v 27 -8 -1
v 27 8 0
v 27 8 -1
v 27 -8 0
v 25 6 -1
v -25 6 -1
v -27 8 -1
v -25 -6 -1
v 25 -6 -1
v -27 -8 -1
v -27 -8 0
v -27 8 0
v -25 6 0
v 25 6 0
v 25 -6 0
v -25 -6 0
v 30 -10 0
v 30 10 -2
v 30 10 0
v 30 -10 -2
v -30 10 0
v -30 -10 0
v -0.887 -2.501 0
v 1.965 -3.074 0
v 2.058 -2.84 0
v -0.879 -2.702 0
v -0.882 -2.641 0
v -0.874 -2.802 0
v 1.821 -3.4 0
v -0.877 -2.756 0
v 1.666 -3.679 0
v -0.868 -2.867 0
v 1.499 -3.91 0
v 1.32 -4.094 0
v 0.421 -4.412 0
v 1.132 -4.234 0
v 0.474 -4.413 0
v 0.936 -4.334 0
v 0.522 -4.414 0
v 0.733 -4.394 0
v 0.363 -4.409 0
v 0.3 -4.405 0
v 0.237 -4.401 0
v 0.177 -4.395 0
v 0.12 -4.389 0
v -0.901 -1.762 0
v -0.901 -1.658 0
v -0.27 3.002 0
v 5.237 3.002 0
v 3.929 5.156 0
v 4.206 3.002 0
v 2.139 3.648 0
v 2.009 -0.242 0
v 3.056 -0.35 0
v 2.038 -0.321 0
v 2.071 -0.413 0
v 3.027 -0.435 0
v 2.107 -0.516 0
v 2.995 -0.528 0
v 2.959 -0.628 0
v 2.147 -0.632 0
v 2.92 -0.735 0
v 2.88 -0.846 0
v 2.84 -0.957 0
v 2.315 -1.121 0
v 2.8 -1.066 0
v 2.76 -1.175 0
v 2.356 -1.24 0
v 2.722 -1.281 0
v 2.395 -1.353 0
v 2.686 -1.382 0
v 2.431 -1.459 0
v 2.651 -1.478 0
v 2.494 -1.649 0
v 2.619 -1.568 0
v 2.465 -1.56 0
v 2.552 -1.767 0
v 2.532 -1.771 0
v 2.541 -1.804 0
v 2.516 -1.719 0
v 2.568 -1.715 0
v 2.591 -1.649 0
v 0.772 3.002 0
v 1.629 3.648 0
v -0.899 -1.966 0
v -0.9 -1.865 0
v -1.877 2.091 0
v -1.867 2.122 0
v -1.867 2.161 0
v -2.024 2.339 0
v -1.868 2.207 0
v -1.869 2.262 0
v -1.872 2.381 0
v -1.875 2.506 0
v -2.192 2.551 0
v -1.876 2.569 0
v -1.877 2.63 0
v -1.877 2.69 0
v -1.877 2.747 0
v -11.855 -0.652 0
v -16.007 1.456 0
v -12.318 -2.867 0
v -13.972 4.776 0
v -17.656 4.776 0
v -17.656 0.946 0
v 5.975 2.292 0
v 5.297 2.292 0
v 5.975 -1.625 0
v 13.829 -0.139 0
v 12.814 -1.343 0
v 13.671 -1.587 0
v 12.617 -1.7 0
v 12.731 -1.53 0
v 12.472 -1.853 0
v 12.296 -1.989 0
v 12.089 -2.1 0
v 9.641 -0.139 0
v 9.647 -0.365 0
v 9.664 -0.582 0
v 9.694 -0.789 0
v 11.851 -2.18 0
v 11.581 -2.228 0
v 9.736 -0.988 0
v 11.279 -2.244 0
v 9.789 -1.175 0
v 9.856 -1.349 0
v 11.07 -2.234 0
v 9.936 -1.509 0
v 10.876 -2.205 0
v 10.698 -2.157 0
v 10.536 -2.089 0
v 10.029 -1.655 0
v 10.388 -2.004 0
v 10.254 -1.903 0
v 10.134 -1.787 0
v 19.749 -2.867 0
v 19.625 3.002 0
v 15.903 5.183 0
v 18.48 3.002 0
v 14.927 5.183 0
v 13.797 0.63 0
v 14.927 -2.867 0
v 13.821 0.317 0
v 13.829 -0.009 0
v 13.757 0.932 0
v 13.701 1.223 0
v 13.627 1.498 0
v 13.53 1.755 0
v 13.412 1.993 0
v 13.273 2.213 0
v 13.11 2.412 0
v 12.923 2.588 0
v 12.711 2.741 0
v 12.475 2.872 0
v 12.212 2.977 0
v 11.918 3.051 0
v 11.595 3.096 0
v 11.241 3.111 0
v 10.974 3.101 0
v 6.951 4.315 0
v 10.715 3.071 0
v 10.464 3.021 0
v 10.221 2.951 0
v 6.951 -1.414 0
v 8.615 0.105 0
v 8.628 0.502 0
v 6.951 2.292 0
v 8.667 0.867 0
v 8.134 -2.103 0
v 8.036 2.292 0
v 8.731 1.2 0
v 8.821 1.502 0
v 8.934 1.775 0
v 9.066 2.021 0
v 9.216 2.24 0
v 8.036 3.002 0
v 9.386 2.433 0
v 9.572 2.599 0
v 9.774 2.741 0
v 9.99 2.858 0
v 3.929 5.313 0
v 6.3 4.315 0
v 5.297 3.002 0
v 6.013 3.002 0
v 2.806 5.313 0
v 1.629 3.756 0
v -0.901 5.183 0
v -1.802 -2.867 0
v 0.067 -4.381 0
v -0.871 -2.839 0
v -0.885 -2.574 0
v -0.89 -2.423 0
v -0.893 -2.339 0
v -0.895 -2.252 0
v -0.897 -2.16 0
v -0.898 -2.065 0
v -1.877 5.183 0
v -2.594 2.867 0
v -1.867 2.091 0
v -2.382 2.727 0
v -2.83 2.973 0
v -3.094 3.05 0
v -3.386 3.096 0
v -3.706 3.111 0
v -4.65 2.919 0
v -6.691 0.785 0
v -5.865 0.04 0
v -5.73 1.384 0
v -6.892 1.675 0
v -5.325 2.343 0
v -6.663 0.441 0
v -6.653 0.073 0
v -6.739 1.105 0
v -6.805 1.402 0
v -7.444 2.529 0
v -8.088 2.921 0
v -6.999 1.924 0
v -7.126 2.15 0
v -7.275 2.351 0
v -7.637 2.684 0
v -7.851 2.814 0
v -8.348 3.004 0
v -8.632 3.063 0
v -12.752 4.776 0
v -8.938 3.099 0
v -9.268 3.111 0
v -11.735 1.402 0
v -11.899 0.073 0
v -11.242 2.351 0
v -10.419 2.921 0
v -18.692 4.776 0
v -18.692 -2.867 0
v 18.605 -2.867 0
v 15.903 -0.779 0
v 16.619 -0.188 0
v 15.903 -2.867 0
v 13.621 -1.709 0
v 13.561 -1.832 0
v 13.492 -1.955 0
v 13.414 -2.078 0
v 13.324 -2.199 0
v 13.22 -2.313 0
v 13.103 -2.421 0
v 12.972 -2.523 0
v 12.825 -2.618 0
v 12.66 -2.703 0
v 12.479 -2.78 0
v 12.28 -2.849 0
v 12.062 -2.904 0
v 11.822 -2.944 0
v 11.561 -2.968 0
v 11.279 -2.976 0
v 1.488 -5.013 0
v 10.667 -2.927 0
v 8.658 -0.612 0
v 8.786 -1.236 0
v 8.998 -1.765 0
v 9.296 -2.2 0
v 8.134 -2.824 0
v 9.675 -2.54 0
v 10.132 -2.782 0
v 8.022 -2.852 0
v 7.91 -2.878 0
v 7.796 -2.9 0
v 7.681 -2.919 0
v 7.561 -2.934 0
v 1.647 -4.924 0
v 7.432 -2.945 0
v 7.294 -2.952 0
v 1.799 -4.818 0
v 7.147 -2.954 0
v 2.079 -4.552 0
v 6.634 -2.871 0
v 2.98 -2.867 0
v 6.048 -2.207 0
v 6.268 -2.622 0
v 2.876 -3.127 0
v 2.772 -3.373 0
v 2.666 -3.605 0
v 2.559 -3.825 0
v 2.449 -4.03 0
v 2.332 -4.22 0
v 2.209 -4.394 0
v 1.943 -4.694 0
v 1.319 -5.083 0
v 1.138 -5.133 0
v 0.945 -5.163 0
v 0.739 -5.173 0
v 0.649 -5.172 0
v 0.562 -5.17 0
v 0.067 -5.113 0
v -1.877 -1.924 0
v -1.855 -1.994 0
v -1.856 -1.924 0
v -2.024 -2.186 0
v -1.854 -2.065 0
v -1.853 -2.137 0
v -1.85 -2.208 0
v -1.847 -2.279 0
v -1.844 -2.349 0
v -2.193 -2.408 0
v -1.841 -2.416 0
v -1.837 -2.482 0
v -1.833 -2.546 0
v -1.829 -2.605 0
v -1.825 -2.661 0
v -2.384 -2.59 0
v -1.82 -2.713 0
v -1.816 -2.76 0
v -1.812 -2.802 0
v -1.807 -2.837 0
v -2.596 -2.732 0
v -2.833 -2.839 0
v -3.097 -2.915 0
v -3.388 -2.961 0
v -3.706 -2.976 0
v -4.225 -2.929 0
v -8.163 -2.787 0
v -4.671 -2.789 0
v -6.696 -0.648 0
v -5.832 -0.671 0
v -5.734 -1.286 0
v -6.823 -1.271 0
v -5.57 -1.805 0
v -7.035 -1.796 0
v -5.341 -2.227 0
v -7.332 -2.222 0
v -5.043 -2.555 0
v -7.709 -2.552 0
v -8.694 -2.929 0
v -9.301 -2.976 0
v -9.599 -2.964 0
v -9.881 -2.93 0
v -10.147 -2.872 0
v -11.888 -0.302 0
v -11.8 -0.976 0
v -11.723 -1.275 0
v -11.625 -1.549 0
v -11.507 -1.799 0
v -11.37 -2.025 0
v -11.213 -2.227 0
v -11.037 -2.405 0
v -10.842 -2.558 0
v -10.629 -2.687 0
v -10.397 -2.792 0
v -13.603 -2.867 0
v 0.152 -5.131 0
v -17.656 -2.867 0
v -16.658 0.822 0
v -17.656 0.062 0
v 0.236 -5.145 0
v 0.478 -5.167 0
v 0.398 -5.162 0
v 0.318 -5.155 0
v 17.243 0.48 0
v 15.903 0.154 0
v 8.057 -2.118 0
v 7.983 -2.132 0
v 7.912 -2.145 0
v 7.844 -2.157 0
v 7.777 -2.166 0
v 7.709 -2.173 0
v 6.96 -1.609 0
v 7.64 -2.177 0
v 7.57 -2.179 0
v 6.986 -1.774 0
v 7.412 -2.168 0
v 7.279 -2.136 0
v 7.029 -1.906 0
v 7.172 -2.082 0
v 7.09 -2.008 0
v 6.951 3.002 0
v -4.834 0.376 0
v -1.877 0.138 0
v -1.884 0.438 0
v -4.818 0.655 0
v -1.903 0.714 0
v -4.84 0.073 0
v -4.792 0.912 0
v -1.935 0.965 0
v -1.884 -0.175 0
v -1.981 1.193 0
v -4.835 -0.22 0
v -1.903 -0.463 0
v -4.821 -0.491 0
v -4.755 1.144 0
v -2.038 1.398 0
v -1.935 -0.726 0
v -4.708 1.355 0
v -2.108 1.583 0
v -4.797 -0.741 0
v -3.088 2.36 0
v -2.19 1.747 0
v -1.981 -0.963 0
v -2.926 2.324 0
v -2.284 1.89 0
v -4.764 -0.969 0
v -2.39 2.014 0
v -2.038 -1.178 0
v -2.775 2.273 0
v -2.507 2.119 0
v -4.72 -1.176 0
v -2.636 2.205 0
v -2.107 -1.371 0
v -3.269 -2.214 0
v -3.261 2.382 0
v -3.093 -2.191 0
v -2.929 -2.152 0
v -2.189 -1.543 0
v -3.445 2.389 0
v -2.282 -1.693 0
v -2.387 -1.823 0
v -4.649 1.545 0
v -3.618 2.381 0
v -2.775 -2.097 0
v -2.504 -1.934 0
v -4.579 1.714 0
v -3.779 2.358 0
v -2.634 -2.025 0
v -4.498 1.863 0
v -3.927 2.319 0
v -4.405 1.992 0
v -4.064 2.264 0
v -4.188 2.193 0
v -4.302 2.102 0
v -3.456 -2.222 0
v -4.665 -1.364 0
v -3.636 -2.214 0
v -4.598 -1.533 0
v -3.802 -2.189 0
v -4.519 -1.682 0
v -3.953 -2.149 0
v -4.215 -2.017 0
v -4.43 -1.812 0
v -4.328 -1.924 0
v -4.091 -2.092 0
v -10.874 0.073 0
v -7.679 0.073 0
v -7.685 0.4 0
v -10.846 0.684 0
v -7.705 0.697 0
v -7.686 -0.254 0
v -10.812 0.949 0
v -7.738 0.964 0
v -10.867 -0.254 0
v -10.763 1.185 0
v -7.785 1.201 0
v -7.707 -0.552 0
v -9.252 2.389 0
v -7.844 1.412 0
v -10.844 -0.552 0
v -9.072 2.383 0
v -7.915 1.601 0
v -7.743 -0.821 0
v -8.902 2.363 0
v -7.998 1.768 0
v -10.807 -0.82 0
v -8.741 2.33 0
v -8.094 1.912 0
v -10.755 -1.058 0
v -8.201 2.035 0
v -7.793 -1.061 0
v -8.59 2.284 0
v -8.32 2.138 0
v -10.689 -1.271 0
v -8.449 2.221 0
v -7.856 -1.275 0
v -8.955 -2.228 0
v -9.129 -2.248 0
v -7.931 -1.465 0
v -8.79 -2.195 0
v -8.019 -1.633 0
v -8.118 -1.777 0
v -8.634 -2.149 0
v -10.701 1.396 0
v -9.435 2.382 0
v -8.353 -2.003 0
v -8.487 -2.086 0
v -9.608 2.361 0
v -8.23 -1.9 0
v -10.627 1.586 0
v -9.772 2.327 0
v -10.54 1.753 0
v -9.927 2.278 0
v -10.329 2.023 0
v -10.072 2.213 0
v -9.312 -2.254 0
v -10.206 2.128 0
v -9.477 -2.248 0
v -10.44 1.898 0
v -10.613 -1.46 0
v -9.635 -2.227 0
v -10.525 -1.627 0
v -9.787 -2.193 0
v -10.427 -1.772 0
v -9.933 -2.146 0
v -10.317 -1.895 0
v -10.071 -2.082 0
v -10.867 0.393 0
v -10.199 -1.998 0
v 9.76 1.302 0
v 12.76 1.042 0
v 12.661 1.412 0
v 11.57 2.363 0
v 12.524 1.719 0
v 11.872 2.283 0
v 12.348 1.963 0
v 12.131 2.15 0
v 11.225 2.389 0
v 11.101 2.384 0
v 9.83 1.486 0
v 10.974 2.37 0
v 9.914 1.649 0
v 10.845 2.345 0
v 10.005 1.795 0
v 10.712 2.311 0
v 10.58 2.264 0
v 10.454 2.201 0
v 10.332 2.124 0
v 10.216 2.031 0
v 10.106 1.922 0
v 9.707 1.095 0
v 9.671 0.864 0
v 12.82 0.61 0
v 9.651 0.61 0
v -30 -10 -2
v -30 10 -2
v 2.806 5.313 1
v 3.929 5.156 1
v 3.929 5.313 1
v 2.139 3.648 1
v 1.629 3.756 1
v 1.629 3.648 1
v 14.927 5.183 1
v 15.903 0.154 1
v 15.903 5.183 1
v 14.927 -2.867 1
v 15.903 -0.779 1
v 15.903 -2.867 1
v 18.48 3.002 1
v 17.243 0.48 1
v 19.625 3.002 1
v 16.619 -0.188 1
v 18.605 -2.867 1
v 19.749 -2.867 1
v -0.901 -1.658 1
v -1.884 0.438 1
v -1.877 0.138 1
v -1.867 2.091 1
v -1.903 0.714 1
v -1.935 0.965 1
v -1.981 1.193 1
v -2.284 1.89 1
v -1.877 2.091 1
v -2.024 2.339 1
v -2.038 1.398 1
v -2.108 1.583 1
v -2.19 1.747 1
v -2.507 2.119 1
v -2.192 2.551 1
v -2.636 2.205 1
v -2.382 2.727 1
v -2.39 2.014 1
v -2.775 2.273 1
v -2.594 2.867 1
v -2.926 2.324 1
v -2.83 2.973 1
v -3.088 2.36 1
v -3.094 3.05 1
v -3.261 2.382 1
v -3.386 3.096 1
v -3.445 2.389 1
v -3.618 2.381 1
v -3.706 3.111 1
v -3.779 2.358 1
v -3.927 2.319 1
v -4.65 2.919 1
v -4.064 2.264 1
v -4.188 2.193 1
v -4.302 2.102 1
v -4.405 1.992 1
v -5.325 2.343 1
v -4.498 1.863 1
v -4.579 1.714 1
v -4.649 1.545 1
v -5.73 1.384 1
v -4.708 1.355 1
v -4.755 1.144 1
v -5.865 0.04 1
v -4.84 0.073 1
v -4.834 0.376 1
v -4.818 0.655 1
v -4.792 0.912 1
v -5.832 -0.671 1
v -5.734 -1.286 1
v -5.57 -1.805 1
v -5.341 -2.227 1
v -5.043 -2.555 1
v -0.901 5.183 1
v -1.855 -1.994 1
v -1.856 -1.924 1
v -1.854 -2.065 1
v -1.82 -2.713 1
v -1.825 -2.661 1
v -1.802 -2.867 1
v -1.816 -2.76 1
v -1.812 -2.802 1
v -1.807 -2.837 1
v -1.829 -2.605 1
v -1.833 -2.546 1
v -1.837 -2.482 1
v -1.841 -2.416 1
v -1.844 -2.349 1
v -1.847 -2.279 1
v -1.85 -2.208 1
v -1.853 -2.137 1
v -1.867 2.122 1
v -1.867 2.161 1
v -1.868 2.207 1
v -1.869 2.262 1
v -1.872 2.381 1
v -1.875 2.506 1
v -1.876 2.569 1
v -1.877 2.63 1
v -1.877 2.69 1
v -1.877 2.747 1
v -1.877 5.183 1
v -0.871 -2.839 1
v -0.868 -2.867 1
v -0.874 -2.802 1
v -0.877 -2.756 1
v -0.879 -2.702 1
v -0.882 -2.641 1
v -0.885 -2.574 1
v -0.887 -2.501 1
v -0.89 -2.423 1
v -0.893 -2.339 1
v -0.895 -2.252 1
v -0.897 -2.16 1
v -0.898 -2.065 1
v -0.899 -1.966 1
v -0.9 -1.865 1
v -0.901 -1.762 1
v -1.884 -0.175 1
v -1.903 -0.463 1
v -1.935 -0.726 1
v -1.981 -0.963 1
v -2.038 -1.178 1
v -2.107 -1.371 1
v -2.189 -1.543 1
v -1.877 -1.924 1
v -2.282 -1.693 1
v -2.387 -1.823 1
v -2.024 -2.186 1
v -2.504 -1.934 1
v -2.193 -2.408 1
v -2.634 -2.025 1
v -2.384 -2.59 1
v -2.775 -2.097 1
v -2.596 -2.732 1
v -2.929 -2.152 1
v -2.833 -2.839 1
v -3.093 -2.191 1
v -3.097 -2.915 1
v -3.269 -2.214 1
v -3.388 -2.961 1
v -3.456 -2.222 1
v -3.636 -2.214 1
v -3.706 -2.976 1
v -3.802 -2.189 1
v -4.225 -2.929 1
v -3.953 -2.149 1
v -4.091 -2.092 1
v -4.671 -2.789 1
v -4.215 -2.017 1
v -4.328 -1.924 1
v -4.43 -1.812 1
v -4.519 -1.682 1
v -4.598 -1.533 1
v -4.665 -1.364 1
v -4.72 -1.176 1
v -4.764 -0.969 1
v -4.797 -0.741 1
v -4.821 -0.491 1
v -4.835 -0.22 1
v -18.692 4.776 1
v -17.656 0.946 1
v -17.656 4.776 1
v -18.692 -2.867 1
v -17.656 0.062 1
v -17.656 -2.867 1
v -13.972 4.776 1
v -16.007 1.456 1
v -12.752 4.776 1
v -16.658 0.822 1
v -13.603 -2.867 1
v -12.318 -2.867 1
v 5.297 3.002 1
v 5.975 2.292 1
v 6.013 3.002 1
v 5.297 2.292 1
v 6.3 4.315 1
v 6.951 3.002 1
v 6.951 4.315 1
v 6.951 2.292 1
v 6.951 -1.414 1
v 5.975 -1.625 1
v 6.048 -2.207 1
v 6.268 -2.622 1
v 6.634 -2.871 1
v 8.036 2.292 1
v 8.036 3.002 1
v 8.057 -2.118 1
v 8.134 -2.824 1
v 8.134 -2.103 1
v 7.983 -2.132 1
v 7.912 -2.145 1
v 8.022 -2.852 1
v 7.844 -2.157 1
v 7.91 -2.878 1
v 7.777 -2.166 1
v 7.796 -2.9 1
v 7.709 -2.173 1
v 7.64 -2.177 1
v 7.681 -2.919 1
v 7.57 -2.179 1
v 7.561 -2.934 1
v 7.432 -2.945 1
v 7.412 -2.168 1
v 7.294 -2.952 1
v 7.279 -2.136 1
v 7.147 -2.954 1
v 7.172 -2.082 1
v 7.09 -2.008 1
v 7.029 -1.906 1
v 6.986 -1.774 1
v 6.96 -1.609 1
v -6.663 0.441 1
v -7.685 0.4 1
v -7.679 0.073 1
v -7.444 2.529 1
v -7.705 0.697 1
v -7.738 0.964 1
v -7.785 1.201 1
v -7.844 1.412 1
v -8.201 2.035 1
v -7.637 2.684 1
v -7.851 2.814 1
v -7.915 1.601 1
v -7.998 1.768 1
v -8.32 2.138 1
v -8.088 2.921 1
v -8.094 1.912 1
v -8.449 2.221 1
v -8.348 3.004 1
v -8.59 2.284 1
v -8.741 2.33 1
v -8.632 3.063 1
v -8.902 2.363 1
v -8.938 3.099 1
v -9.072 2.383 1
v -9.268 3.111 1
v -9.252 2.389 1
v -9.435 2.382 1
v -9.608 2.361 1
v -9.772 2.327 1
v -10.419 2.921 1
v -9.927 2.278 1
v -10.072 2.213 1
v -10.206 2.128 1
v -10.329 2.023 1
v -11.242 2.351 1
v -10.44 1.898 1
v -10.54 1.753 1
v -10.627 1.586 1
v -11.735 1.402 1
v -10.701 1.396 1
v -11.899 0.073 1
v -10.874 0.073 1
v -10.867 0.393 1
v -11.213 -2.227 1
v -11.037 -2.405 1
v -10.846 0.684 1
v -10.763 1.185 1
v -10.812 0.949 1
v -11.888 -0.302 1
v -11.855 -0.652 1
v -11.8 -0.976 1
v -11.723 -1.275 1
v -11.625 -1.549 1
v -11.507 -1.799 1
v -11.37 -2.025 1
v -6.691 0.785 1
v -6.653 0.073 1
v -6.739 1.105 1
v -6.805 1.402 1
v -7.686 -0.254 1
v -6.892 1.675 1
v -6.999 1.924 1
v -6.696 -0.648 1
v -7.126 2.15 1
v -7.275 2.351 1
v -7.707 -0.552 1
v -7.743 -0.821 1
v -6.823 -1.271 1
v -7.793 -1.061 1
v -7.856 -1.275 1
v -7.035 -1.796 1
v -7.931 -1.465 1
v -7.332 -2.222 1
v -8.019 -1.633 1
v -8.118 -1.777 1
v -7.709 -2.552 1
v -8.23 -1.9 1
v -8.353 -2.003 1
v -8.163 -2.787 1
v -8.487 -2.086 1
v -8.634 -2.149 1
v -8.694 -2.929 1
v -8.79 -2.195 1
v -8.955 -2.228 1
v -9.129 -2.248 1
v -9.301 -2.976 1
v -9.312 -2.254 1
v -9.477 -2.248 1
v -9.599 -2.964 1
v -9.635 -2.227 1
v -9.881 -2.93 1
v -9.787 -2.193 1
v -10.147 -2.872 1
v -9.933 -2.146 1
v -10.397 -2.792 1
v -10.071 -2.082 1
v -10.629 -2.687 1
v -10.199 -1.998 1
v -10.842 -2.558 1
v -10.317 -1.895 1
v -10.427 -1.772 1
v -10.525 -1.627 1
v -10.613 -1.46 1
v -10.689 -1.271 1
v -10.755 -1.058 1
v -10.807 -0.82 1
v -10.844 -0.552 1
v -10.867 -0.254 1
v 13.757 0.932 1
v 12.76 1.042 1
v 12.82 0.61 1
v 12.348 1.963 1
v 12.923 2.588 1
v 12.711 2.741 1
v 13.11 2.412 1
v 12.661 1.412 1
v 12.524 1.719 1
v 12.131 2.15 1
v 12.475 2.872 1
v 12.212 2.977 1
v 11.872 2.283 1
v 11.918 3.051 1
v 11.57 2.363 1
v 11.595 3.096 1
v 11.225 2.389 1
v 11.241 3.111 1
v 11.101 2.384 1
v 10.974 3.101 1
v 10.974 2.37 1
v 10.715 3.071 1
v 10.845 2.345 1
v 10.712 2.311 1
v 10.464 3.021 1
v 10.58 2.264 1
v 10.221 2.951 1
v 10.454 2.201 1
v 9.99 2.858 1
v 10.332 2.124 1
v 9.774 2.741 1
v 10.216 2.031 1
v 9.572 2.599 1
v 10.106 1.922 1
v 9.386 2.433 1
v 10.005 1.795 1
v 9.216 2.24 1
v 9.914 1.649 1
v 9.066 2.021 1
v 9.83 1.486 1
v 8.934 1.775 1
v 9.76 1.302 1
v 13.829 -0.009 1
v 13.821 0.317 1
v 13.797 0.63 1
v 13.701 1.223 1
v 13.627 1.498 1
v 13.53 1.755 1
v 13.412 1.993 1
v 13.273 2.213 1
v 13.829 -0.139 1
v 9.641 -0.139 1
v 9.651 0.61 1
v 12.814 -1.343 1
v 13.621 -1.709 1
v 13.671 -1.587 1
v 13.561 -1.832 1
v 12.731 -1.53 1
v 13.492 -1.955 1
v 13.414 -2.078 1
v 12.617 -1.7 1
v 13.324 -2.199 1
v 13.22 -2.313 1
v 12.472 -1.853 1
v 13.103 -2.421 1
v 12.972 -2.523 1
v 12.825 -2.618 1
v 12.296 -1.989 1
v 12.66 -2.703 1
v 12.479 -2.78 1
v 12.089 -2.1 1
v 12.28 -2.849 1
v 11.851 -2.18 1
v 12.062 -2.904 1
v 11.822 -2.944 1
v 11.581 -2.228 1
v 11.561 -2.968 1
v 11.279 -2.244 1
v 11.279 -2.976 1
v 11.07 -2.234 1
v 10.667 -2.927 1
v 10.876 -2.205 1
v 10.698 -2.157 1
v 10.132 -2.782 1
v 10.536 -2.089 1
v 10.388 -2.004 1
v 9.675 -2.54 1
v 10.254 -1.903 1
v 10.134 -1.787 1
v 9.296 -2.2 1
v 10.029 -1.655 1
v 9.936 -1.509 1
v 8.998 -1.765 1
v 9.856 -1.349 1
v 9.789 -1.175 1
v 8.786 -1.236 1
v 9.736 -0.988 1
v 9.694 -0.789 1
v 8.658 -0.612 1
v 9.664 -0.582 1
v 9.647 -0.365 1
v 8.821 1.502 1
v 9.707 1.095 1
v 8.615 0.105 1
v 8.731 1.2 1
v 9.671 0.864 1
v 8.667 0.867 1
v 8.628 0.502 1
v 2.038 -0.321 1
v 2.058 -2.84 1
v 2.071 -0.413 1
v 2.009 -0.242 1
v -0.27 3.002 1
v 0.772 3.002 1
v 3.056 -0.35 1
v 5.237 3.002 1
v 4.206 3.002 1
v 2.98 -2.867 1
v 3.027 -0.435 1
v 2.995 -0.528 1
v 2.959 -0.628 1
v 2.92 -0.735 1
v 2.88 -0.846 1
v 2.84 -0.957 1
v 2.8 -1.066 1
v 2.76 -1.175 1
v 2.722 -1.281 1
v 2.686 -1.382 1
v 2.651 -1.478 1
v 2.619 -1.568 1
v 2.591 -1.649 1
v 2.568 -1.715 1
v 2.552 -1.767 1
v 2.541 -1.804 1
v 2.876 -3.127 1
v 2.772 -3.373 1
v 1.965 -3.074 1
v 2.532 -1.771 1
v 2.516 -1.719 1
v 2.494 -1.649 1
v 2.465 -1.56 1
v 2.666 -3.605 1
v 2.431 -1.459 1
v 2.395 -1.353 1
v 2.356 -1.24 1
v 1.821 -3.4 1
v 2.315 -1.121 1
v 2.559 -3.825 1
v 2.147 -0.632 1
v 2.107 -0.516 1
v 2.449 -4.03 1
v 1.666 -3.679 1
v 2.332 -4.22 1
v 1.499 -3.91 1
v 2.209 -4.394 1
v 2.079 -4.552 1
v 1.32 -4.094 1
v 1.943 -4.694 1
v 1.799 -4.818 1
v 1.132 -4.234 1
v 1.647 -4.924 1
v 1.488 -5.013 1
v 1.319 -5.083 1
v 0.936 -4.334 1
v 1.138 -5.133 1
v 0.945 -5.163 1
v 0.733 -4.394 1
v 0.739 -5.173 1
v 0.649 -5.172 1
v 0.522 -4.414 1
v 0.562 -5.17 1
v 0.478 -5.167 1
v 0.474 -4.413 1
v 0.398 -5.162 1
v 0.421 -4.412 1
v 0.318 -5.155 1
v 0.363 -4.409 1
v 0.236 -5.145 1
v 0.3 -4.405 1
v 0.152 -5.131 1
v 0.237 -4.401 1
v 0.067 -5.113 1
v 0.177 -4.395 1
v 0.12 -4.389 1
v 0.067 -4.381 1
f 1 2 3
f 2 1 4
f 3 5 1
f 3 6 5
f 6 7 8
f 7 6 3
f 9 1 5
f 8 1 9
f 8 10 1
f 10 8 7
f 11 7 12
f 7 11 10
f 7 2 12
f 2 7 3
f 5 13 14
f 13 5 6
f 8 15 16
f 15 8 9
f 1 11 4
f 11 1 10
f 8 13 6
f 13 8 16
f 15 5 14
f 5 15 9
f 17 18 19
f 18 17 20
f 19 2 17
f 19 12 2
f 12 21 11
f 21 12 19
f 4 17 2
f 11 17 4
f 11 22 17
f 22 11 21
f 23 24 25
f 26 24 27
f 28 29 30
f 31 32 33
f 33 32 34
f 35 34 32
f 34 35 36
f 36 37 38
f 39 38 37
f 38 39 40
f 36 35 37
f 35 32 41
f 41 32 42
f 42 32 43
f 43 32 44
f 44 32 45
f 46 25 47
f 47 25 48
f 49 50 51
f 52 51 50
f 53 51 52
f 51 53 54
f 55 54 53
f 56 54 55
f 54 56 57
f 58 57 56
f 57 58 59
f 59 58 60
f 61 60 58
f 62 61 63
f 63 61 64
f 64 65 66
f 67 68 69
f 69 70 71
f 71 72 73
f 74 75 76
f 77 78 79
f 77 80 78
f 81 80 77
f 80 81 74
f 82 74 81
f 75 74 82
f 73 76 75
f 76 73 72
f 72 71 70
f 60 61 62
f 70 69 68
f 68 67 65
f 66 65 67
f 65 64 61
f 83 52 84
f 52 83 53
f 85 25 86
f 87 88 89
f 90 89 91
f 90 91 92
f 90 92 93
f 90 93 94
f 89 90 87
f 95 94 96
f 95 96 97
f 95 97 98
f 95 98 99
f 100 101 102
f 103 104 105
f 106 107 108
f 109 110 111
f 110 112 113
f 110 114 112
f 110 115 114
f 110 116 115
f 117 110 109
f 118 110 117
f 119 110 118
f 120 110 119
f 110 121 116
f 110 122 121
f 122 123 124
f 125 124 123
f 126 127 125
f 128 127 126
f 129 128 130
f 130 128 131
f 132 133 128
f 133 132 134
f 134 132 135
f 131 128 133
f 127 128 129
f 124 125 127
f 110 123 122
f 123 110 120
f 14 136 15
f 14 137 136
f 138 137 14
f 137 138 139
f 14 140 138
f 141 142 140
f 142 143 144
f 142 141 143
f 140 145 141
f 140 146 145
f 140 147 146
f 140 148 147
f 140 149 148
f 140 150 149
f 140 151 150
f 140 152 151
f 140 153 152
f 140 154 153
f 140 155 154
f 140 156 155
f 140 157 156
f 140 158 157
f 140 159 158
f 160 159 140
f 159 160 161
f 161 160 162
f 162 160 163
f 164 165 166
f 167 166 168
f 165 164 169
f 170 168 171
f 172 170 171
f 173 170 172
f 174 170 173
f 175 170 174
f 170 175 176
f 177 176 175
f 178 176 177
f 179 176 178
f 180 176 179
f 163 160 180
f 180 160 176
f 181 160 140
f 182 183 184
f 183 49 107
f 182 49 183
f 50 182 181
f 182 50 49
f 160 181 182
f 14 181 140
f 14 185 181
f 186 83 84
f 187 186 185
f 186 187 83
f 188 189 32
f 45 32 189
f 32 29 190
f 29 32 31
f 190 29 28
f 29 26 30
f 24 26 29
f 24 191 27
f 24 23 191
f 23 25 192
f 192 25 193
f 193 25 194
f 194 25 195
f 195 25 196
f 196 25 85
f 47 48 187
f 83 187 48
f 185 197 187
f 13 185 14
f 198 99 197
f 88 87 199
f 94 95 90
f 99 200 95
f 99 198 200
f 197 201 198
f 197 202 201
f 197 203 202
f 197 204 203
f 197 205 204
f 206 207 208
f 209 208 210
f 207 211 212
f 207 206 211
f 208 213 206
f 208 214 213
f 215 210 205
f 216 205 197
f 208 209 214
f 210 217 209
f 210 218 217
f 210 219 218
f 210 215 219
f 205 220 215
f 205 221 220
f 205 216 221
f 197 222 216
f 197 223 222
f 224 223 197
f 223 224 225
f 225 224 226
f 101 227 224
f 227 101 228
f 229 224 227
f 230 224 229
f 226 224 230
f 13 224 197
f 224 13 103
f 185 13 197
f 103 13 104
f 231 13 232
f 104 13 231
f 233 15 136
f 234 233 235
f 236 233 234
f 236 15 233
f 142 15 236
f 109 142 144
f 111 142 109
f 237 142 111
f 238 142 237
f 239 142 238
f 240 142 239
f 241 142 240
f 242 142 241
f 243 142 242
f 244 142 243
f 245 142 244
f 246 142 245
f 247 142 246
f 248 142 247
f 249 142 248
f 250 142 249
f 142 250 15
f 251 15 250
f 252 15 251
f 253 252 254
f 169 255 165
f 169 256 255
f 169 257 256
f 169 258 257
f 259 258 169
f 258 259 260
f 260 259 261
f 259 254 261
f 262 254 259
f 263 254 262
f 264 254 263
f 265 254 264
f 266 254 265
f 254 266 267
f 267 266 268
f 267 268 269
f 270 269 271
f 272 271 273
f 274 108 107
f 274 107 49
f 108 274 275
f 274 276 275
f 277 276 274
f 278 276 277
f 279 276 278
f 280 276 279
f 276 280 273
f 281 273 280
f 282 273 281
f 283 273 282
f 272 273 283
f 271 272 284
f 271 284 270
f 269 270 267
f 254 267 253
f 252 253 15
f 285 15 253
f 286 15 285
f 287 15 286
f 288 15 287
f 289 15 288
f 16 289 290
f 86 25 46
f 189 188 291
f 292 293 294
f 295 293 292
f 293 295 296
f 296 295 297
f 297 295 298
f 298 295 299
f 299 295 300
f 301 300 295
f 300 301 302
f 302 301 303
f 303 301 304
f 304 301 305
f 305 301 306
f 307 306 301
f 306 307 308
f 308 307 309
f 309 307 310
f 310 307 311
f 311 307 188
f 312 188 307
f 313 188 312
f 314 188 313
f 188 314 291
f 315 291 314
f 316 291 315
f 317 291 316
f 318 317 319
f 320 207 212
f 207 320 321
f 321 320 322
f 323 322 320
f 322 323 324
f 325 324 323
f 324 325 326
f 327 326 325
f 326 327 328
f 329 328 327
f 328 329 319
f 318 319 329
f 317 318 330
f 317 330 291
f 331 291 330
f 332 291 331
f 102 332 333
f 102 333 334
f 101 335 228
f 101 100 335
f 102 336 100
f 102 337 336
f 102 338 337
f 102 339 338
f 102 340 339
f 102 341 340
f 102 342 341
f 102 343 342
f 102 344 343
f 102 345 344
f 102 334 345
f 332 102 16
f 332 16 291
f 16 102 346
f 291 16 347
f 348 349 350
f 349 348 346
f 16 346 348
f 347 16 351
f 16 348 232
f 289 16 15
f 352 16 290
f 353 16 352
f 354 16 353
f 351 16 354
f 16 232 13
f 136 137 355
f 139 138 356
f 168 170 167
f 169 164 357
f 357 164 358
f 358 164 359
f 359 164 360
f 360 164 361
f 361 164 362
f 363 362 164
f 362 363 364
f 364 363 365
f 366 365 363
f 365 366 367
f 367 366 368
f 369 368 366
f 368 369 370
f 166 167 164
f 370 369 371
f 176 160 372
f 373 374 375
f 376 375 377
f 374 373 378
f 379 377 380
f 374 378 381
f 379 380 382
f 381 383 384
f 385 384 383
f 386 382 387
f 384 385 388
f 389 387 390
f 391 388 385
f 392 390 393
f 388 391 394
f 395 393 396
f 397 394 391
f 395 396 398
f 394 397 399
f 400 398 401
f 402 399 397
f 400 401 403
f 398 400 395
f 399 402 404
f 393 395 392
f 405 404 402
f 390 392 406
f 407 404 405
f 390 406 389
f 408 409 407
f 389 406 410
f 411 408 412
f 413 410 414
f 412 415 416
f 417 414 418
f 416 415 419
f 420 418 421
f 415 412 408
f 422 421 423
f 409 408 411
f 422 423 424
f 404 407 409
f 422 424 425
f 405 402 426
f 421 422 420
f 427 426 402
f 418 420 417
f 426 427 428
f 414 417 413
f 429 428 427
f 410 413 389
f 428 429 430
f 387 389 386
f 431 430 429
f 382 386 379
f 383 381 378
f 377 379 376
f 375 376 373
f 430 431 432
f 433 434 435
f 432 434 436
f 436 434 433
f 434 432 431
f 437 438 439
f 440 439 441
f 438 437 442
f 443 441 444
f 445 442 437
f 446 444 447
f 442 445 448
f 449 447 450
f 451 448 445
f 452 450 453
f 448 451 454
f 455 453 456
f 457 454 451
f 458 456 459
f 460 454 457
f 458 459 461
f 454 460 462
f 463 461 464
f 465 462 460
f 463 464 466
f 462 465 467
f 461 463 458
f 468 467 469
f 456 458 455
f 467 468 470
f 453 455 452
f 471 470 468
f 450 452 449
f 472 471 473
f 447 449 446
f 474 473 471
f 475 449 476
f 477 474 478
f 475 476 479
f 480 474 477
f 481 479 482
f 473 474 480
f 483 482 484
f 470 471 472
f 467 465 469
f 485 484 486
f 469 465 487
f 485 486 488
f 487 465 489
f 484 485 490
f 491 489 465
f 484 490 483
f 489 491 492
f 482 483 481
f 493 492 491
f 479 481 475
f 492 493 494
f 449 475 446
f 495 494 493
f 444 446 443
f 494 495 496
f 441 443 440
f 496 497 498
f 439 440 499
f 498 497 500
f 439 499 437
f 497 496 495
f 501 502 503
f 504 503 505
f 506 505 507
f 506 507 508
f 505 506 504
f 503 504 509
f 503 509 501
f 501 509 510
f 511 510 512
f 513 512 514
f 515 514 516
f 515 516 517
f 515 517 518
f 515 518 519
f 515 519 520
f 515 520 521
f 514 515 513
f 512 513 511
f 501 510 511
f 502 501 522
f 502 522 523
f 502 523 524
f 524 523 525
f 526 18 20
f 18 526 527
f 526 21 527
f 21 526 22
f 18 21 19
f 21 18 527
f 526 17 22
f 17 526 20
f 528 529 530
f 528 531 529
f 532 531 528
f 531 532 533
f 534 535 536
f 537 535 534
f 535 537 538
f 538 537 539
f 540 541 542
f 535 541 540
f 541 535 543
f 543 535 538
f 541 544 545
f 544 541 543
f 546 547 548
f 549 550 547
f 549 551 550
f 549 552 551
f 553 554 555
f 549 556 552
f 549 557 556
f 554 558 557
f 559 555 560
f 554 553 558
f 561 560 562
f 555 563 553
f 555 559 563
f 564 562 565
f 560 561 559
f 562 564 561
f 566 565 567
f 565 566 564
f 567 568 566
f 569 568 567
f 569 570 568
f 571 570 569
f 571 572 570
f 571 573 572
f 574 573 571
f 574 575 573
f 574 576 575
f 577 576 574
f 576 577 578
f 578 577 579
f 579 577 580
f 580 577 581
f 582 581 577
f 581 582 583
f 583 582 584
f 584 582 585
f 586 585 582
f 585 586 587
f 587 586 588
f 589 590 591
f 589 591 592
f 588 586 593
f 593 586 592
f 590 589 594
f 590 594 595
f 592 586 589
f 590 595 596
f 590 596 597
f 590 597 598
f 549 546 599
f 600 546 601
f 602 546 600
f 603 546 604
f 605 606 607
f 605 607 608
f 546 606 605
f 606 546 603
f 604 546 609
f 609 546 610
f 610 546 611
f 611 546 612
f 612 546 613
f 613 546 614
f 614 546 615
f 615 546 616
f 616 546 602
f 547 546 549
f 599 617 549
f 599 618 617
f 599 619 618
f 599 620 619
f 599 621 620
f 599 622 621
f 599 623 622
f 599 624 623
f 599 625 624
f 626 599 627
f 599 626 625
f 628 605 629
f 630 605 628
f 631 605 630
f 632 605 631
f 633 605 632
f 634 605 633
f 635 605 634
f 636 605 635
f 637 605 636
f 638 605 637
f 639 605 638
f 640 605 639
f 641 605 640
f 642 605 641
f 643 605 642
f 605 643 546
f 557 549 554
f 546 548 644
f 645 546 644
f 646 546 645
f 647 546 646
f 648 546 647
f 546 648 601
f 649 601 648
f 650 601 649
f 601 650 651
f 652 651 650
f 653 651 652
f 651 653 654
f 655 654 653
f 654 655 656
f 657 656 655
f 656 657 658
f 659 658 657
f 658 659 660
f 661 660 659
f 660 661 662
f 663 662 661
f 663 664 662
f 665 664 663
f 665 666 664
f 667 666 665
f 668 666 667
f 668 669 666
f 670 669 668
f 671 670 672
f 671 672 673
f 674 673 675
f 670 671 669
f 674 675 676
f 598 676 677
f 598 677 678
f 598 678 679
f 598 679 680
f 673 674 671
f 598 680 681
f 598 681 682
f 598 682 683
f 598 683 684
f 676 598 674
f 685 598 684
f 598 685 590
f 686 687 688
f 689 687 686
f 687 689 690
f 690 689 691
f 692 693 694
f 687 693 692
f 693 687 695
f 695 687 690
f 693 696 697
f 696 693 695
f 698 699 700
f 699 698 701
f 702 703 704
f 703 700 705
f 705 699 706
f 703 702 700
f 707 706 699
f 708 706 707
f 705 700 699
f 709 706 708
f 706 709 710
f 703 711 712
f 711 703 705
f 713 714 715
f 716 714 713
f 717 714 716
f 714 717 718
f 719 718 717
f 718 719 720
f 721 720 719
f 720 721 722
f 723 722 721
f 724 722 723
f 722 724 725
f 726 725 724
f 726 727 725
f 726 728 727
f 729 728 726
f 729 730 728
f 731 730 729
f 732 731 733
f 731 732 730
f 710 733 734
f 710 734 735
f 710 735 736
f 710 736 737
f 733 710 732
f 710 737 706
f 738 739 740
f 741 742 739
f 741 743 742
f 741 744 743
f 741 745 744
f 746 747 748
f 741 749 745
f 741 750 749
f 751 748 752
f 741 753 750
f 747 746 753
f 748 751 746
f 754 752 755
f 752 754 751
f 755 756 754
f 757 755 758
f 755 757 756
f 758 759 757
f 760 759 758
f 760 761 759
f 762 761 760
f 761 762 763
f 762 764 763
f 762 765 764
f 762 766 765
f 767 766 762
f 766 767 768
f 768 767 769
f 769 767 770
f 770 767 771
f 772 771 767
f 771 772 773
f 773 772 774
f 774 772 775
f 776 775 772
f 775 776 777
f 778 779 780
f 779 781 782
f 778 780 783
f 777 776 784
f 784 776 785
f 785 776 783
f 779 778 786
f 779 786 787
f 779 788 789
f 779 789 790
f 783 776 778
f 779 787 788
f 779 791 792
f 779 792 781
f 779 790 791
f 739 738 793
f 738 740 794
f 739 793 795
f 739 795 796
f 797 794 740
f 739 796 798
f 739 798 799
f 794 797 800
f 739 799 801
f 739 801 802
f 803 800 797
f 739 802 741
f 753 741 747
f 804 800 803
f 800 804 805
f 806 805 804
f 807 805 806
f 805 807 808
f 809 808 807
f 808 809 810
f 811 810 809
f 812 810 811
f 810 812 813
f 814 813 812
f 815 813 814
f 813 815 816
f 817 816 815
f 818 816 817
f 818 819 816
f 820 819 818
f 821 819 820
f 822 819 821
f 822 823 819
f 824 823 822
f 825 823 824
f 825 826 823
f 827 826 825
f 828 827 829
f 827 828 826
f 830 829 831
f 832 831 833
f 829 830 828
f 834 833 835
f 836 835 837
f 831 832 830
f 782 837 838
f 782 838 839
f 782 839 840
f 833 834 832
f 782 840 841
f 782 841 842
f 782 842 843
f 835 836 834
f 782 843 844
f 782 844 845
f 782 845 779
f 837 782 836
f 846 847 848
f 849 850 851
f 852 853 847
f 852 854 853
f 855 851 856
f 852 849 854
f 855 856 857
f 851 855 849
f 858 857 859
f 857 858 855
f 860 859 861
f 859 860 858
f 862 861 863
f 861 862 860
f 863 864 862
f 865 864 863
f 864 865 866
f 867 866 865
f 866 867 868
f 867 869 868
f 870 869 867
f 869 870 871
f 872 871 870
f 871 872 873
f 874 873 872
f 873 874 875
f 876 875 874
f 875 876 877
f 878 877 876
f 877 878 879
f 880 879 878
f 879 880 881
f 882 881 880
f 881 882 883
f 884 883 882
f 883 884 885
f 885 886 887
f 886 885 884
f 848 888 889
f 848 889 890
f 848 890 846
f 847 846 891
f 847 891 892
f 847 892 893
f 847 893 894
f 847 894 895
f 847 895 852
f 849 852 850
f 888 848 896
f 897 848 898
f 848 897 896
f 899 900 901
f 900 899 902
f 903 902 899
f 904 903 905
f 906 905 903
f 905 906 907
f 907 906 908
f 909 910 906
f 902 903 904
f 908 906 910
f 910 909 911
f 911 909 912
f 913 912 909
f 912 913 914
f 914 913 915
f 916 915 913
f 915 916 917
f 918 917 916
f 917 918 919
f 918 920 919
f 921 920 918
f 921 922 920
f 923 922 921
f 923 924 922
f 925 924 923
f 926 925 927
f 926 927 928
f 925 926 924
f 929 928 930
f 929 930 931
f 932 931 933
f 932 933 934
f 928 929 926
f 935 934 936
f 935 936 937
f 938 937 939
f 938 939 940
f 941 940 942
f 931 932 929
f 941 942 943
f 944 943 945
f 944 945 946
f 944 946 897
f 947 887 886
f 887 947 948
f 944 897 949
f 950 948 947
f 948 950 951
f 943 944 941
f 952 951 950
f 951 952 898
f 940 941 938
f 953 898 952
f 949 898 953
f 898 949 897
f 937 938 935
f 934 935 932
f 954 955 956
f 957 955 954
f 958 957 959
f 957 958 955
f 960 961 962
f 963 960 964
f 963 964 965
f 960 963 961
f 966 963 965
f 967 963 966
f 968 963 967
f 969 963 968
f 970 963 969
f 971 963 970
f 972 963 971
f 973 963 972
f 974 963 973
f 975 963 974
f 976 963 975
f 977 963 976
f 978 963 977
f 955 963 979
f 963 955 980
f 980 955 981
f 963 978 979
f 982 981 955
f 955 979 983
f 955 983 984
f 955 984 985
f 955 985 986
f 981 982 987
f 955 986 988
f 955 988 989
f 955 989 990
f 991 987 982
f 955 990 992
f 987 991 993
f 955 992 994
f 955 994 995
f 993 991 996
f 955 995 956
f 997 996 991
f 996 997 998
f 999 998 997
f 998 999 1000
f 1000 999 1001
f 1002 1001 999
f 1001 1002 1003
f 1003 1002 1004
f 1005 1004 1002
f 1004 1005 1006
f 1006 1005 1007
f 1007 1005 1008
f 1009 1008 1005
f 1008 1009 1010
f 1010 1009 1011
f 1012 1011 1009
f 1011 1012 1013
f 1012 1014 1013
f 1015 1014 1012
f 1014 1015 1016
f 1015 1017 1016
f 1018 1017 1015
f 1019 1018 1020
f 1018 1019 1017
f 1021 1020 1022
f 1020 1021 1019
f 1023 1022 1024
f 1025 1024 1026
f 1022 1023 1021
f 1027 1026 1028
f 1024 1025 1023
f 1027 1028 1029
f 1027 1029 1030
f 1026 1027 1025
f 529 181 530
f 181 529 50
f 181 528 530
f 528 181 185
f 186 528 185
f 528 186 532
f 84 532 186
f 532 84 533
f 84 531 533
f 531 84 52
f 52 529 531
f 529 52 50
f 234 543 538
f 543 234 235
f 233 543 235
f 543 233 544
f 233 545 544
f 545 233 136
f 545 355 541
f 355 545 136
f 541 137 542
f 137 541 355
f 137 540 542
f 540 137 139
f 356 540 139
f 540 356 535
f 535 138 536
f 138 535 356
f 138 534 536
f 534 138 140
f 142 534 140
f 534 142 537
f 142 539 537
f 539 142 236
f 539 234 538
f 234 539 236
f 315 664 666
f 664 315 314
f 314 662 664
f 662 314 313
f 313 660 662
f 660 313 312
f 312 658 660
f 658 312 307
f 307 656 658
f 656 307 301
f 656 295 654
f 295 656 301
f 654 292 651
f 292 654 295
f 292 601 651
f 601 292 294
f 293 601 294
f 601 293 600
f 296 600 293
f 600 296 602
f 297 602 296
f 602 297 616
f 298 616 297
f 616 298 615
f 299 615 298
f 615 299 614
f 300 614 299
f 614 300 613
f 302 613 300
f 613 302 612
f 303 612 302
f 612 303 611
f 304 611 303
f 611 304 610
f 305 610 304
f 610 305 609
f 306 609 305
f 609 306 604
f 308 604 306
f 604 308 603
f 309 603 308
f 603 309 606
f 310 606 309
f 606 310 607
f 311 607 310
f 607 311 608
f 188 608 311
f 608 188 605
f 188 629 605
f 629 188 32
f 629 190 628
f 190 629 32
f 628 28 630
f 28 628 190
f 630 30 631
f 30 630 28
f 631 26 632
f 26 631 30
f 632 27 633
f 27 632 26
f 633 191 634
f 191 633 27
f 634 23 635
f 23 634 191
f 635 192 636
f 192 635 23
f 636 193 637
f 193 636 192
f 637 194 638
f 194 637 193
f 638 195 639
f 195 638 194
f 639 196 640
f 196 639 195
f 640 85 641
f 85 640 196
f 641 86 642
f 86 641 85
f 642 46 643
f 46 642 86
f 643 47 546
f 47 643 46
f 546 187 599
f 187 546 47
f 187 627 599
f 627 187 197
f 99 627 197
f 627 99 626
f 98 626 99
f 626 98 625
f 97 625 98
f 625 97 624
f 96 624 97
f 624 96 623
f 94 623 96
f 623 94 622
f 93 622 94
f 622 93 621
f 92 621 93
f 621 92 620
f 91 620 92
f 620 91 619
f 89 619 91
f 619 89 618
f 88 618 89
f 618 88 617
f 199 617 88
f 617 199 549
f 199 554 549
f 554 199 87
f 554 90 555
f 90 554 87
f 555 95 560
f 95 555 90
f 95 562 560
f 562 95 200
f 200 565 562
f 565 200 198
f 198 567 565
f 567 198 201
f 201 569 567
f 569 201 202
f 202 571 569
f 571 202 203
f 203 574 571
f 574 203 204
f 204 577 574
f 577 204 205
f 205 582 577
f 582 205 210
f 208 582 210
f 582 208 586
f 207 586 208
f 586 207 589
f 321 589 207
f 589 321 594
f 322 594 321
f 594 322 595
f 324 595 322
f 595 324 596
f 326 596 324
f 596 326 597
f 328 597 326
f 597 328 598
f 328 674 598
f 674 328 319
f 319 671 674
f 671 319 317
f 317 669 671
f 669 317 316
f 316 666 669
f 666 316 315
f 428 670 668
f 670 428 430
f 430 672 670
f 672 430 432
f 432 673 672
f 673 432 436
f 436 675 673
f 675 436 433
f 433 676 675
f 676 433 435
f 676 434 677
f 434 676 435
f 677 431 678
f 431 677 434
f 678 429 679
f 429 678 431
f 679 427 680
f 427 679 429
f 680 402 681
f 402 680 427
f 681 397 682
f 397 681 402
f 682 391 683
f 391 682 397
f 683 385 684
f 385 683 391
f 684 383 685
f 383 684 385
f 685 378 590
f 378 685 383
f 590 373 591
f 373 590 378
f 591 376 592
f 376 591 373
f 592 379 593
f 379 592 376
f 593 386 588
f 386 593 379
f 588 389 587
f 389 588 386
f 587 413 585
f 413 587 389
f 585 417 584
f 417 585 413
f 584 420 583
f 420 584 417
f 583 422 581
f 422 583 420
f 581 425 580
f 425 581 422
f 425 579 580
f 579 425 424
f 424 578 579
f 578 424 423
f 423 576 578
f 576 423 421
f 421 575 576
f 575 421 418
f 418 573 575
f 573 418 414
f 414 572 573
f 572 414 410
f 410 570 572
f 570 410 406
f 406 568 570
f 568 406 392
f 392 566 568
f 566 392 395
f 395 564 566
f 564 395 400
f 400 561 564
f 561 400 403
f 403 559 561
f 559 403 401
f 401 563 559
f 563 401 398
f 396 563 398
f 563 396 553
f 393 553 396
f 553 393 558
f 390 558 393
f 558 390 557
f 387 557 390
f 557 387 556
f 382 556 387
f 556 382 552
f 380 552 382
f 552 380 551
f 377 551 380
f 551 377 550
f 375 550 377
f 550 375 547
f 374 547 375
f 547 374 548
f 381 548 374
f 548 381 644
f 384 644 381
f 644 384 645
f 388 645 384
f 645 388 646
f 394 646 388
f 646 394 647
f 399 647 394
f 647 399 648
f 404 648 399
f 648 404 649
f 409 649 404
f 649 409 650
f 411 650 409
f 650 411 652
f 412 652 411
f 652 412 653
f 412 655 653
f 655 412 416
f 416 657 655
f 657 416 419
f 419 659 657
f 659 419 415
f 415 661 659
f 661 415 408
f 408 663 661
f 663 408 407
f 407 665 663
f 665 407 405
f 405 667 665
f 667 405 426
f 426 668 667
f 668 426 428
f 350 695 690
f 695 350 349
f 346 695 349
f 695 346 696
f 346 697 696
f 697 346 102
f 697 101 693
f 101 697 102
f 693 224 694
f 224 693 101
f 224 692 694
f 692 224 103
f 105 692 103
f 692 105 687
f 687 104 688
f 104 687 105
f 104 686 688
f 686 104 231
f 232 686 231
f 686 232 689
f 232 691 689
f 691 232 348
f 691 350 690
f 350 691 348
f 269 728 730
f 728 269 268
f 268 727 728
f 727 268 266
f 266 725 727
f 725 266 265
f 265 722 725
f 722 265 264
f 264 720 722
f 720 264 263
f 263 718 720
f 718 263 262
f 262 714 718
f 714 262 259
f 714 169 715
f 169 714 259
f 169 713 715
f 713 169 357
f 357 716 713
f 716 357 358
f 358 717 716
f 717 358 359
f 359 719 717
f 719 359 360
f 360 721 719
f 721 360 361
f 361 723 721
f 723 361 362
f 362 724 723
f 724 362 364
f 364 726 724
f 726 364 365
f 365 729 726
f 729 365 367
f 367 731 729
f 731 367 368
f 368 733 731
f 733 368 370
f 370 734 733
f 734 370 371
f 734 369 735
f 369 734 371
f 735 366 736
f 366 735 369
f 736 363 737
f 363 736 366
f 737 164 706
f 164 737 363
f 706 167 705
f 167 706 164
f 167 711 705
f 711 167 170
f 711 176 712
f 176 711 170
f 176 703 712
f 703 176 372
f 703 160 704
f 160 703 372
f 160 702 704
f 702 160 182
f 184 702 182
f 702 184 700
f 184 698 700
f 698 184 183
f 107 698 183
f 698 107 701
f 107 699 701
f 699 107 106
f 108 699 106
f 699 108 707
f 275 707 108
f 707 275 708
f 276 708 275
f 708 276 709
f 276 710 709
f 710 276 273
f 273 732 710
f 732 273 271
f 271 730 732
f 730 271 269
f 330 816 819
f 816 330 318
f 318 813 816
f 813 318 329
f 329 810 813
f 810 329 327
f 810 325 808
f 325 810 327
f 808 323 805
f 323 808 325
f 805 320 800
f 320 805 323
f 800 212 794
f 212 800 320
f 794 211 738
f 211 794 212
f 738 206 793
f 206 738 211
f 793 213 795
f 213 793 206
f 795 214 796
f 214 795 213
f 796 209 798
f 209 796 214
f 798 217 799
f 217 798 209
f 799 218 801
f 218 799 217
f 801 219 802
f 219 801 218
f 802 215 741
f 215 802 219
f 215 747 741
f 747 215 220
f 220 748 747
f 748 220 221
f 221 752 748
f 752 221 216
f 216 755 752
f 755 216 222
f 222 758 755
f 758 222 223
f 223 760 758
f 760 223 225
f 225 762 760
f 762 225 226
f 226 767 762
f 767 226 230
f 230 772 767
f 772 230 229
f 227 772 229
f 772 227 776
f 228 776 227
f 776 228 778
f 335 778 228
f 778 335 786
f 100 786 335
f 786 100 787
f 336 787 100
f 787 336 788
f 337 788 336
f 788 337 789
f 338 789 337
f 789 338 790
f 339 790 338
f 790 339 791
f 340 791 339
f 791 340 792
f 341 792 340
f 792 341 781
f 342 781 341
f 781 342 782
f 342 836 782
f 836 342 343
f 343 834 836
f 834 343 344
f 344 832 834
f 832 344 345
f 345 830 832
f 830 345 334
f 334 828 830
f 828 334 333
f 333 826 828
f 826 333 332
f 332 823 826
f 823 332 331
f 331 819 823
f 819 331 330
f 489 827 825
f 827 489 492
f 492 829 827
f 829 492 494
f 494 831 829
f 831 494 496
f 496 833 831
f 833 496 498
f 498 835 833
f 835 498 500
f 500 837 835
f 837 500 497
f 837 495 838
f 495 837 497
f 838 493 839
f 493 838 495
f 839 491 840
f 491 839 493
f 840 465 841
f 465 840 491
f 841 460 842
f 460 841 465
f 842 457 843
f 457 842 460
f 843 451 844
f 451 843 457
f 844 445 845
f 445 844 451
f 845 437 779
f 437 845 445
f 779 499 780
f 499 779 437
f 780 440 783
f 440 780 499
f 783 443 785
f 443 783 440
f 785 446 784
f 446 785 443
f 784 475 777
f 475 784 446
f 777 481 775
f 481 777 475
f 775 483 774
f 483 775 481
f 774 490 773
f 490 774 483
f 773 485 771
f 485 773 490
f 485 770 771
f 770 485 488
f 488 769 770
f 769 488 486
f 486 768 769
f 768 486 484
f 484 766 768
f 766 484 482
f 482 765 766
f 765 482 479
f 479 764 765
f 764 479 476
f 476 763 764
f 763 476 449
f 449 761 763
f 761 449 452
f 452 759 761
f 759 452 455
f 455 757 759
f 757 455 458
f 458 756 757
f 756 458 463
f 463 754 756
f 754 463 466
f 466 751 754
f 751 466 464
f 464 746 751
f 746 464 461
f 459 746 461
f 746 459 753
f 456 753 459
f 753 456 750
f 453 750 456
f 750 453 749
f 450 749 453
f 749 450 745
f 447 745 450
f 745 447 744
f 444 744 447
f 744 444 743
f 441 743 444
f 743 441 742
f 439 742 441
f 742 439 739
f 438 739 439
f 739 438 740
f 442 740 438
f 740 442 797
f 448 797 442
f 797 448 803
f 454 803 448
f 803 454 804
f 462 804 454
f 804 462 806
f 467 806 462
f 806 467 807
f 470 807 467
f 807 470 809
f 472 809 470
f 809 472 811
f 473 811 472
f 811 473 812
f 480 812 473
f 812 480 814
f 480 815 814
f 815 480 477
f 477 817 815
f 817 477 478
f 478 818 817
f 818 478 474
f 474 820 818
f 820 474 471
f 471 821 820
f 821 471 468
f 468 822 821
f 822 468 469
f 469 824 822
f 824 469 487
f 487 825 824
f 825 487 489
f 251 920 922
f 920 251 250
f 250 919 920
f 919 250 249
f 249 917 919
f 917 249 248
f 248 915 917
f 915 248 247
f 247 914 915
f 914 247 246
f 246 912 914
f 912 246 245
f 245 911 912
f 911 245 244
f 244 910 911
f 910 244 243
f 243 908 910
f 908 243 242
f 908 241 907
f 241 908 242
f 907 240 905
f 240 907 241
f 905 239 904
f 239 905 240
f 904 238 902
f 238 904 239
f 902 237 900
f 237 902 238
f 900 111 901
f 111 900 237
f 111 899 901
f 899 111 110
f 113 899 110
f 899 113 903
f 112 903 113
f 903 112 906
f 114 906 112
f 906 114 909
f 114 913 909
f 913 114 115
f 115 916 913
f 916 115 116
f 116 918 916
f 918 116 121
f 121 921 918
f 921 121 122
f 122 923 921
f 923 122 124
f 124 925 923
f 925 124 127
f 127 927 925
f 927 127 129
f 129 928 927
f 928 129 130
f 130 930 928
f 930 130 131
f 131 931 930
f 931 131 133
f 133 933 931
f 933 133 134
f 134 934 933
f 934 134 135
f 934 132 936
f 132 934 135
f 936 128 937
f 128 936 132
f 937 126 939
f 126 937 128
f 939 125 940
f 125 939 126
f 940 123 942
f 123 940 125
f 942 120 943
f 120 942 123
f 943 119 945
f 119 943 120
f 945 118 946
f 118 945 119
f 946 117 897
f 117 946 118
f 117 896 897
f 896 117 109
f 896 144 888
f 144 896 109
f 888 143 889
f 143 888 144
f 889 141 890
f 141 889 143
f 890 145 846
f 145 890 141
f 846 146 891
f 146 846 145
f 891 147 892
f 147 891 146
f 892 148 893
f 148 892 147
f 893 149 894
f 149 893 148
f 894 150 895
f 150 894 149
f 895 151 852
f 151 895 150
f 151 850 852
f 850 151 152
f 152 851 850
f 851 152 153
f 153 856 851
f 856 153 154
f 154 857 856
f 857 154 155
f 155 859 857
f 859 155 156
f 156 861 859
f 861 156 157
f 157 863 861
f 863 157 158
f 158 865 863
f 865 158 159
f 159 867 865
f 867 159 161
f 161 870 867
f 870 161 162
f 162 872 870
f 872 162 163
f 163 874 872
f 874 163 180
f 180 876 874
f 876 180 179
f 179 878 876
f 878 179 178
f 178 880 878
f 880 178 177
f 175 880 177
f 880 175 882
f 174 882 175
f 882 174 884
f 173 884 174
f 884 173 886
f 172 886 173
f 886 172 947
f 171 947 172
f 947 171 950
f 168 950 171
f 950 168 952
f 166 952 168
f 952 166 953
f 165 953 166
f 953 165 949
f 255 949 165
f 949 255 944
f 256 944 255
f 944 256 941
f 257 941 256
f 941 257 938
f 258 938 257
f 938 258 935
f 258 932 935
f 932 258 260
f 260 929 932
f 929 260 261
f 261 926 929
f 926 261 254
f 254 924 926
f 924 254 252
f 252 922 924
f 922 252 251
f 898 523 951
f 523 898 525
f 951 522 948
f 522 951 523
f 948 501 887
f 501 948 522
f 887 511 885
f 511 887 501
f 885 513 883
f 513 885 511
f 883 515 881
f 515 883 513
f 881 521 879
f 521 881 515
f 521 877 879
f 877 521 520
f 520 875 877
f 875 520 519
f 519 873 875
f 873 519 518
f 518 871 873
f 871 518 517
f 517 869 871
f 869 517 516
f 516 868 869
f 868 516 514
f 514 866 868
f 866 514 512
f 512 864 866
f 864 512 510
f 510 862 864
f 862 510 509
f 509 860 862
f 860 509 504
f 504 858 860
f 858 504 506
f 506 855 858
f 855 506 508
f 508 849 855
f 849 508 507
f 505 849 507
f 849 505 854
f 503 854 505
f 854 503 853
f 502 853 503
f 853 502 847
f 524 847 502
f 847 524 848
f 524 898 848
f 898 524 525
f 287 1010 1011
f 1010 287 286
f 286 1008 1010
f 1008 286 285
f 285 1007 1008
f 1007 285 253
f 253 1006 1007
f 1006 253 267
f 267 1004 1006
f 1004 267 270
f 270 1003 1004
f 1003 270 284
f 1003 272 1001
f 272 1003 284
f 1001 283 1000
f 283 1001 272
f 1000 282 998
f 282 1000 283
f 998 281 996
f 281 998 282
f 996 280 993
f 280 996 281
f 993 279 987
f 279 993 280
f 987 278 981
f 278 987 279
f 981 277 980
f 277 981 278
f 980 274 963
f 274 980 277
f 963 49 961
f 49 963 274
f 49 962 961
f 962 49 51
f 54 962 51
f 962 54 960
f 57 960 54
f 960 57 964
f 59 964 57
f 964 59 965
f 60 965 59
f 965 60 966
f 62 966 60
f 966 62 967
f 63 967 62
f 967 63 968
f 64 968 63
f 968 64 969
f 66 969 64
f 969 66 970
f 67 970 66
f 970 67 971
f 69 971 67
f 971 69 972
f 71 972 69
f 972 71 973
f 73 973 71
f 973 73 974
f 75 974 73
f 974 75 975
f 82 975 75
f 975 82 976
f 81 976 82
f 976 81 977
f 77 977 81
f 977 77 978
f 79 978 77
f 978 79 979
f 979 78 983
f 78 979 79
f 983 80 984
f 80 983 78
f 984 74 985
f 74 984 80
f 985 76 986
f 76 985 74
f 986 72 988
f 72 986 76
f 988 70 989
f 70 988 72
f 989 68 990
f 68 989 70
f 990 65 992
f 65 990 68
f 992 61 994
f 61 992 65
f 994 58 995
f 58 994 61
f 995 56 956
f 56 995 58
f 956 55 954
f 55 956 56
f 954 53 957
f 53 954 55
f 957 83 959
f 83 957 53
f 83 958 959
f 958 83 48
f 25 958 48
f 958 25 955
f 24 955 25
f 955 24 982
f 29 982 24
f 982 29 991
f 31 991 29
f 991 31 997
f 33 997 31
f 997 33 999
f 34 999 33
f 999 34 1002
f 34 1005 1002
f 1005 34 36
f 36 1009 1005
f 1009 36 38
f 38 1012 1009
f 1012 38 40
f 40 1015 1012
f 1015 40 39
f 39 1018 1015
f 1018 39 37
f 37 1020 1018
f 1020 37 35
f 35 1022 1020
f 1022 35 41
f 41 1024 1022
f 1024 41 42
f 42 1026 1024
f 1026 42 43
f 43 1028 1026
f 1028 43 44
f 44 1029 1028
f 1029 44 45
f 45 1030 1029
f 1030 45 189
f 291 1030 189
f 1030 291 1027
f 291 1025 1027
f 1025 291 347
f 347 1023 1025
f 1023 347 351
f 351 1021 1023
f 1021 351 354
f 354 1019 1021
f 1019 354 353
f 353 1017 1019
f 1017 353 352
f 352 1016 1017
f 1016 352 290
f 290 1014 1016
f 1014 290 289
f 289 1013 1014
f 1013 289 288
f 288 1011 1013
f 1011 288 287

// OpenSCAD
module jmenovka( text="Jméno", frame=true ) {
    pismo    = 8;
    x   = 60;
    y   = 2.5*pismo;
    z   = 2;

    ramecek = 1/10;

    velikost = [x,y,z];

    translate( -velikost/2 - [0,0,z/2]) {
        difference() {
        cube( velikost );

            if ( frame ) {
                translate( [ ramecek*x/2, y-z-ramecek*y, z/2 ] )
                    cube( [(1-ramecek)*x,z,z] );

                translate( [ ramecek*x/2, ramecek*y, z/2 ] )
                    cube( [(1-ramecek)*x,z,z] );

                translate( [ ramecek*x/2, ramecek*y, z/2 ] )
                    cube( [z,(1-2*ramecek)*y,z] );

                translate( [ x-z-ramecek*x/2, ramecek*y, z/2 ] )
                    cube( [z,(1-2*ramecek)*y,z] );
            }
        }
    }

    color("black")
        translate([0,0,0])
        linear_extrude( height=z/2 )
            text( text=text, size=pismo, halign="center", valign="center", spacing=1 );
}

//translate([-50,0,0])
//    jmenovka("Myslivec");
//translate([50,0,0])
    jmenovka("Kodýtek");
